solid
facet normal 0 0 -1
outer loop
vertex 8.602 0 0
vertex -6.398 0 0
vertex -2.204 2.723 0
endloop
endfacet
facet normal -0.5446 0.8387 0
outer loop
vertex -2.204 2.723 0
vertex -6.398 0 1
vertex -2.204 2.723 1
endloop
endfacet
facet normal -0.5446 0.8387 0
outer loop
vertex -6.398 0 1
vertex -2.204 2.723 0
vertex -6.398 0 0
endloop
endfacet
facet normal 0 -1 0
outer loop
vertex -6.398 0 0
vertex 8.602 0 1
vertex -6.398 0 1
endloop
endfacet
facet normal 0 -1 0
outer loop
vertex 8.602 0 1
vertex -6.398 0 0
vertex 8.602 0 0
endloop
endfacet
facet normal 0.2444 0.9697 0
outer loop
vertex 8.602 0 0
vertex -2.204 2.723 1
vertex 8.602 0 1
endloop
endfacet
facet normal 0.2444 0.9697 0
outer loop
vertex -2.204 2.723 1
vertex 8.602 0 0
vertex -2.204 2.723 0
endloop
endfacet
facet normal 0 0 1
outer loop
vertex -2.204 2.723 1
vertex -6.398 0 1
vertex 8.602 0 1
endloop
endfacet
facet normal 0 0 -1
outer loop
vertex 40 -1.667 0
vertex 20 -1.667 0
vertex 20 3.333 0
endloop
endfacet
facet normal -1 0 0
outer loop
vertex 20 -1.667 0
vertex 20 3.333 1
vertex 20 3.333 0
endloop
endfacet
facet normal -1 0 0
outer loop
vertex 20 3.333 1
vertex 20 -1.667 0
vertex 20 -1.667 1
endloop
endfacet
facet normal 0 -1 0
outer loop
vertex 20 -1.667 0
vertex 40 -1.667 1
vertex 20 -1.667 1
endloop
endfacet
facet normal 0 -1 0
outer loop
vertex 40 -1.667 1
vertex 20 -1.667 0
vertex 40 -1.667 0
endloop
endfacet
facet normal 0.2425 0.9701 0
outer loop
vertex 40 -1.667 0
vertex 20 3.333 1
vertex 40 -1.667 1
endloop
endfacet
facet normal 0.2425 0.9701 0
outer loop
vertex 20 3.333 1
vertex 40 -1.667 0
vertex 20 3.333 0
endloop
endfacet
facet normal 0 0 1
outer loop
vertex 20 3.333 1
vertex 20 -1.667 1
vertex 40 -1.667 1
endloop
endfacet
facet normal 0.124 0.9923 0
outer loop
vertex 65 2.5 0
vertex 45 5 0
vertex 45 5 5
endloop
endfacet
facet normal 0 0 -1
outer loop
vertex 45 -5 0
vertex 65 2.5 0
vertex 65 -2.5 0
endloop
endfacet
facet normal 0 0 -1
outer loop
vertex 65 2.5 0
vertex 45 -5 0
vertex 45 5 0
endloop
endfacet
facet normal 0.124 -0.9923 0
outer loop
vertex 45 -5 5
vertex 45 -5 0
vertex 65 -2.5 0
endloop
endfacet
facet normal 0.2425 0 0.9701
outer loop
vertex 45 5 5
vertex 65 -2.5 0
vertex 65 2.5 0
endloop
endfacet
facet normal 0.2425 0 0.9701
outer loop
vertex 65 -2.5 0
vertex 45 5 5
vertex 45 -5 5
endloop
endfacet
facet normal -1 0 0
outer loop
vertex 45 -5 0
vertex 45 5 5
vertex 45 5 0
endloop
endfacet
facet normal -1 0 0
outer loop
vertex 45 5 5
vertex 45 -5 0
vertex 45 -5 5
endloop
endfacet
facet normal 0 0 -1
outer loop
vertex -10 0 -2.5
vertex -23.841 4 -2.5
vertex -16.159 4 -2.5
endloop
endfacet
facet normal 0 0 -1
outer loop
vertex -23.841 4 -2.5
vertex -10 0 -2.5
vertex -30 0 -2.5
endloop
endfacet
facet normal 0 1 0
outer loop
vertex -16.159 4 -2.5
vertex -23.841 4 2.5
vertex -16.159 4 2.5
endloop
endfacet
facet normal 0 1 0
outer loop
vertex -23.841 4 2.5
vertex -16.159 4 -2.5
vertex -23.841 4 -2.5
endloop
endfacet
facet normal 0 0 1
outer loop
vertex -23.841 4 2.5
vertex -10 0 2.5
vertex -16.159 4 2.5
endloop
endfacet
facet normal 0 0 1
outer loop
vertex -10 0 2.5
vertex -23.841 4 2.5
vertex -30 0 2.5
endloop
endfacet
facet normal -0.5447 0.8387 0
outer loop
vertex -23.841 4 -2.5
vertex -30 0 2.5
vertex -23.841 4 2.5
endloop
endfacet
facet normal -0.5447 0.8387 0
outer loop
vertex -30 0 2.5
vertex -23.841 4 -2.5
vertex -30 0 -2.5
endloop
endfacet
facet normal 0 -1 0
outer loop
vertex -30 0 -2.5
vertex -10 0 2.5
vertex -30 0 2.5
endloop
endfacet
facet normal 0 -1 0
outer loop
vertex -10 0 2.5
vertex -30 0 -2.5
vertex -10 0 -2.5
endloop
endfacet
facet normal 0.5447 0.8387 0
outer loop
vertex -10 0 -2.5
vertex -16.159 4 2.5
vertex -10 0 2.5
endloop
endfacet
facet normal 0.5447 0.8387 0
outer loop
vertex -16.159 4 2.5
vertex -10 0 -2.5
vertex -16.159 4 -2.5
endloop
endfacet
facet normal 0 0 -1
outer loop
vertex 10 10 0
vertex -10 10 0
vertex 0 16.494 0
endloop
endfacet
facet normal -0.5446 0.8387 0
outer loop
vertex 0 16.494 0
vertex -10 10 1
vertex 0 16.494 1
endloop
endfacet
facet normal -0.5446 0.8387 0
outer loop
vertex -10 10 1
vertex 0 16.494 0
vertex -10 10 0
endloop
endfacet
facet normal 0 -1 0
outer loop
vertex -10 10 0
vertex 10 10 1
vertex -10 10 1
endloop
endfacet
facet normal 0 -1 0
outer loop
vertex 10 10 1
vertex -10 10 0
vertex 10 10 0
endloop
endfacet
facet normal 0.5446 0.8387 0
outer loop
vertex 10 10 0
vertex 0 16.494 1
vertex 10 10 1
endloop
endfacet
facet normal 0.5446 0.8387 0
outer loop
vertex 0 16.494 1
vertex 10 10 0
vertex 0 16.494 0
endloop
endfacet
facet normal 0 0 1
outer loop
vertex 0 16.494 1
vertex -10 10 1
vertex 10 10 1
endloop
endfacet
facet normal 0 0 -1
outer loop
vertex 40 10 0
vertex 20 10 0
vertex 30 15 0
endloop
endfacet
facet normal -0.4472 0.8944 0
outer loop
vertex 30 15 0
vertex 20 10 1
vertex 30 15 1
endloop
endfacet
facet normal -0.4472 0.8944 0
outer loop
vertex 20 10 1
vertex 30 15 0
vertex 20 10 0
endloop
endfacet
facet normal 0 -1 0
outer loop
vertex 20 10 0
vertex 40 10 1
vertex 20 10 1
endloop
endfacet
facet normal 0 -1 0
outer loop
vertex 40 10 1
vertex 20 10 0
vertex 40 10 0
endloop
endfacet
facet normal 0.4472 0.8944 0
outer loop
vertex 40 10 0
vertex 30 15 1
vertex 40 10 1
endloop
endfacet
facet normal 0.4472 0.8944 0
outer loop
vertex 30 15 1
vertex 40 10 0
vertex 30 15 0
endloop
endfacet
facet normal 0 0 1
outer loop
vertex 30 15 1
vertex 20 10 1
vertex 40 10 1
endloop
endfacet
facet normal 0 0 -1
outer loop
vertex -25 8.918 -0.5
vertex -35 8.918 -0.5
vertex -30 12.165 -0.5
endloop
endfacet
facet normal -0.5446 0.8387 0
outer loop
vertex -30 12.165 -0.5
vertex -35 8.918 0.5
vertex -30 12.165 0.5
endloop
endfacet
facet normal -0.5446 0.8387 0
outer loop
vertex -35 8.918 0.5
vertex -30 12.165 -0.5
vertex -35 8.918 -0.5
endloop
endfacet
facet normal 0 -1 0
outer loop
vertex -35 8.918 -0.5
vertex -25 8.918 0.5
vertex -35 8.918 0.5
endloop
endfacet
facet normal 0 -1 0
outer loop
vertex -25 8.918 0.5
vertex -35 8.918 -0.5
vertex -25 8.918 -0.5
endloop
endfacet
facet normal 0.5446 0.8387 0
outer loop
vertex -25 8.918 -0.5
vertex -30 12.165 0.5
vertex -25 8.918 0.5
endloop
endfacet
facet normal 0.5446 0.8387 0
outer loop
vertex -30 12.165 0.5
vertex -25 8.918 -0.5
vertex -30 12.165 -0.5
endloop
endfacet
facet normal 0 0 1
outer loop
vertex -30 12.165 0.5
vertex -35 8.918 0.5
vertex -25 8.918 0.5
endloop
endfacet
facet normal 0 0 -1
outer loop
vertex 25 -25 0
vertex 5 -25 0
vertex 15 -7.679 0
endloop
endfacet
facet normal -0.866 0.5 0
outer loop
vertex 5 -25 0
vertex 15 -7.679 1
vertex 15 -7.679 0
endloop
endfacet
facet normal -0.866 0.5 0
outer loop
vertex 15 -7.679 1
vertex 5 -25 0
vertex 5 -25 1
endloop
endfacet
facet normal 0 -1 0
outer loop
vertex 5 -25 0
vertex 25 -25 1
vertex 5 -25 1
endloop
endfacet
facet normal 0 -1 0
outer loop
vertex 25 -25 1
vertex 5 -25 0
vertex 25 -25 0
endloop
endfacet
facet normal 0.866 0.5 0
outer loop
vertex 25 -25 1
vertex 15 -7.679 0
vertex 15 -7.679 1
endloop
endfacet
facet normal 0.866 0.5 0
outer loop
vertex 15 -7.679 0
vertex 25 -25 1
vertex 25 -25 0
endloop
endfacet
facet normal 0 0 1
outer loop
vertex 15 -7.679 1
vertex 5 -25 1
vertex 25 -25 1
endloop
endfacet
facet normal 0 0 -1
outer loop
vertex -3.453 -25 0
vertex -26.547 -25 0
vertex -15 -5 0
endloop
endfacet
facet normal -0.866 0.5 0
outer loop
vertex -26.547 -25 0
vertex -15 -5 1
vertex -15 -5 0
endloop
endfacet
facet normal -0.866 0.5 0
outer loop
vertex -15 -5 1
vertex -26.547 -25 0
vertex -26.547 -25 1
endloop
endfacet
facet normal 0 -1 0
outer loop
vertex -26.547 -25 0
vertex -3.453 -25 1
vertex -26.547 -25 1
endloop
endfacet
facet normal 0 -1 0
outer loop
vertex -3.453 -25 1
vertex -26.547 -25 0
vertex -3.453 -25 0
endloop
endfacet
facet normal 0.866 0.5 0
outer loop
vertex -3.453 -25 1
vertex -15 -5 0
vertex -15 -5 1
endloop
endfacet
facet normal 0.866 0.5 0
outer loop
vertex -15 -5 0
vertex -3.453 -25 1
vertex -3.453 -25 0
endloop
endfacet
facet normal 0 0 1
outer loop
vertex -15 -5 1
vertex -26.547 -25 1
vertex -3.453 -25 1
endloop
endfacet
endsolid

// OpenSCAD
/*
Triangles.scad
 Author: Tim Koopman
 https://github.com/tkoopman/Delta-Diamond/blob/master/OpenSCAD/Triangles.scad

         angleCA
           /|\
        a / H \ c
         /  |  \
 angleAB ------- angleBC
            b

Standard Parameters
  center: true/false
    If true same as centerXYZ = [true, true, true]

  centerXYZ: Vector of 3 true/false values [CenterX, CenterY, CenterZ]
    center must be left undef

  height: The 3D height of the Triangle. Ignored if heights defined

  heights: Vector of 3 height values heights @ [angleAB, angleBC, angleCA]
    If CenterZ is true each height will be centered individually, this means
    the shape will be different depending on CenterZ. Most times you will want
    CenterZ to be true to get the shape most people want.
*/

/*
Triangle
  a: Length of side a
  b: Length of side b
  angle: angle at point angleAB
*/
module Triangle(
      a, b, angle, height=1, heights=undef,
      center=undef, centerXYZ=[false,false,false])
{
  // Calculate Heights at each point
  heightAB = ((heights==undef) ? height : heights[0])/2;
  heightBC = ((heights==undef) ? height : heights[1])/2;
  heightCA = ((heights==undef) ? height : heights[2])/2;
  centerZ = (center || (center==undef && centerXYZ[2]))?0:max(heightAB,heightBC,heightCA);

  // Calculate Offsets for centering
  offsetX = (center || (center==undef && centerXYZ[0]))?((cos(angle)*a)+b)/3:0;
  offsetY = (center || (center==undef && centerXYZ[1]))?(sin(angle)*a)/3:0;

  pointAB1 = [-offsetX,-offsetY, centerZ-heightAB];
  pointAB2 = [-offsetX,-offsetY, centerZ+heightAB];
  pointBC1 = [b-offsetX,-offsetY, centerZ-heightBC];
  pointBC2 = [b-offsetX,-offsetY, centerZ+heightBC];
  pointCA1 = [(cos(angle)*a)-offsetX,(sin(angle)*a)-offsetY, centerZ-heightCA];
  pointCA2 = [(cos(angle)*a)-offsetX,(sin(angle)*a)-offsetY, centerZ+heightCA];

  polyhedron(
    points=[  pointAB1, pointBC1, pointCA1,
          pointAB2, pointBC2, pointCA2 ],
    faces=[
      [0, 1, 2],
      [3, 5, 4],
      [0, 3, 1],
      [1, 3, 4],
      [1, 4, 2],
      [2, 4, 5],
      [2, 5, 0],
      [0, 5, 3] ] );
}

/*
Isosceles Triangle
  Exactly 2 of the following paramaters must be defined.
  If all 3 defined H will be ignored.
  b: length of side b
  angle: angle at points angleAB & angleBC.
*/
module Isosceles_Triangle(
      b, angle, H=undef, height=1, heights=undef,
      center=undef, centerXYZ=[true, false, false])
{
  valid =   (angle!=undef)?((angle < 90) && (b!=undef||H!=undef)) : (b!=undef&&H!=undef);
  ANGLE = (angle!=undef) ? angle : atan(H / (b/2));
  a = (b==undef)?(H/sin((180-(angle*2))/2)) :
     (b / cos(ANGLE))/2;
  B = (b==undef)? (cos(angle)*a)*2:b;
  if (valid)
  {
    Triangle(a=a, b=B, angle=ANGLE, height=height, heights=heights,
          center=center, centerXYZ=centerXYZ);
  } else {
    echo("Invalid Isosceles_Triangle. Must specify any 2 of b, angle and H, and if angle used angle must be less than 90");
  }
}

/*
Right Angled Triangle
  Create a Right Angled Triangle where the hypotenuse will be calculated.

       |\
      a| \
       |  \
       ----
         b
  a: length of side a
  b: length of side b
*/
module Right_Angled_Triangle(
      a, b, height=1, heights=undef,
      center=undef, centerXYZ=[false, false, false])
{
  Triangle(a=a, b=b, angle=90, height=height, heights=heights,
        center=center, centerXYZ=centerXYZ);
}

/*
Wedge
  Is same as Right Angled Triangle with 2 different heights, and rotated.
  Good for creating support structures.
*/
module Wedge(a, b, w1, w2)
{
  rotate([90,0,0])
    Right_Angled_Triangle(a, b, heights=[w1, w2, w1], centerXYZ=[false, false, true]);
}

/*
Equilateral Triangle
  Create a Equilateral Triangle.

  l: Length of all sides (a, b & c)
  H: Triangle size will be based on the this 2D height
    When using H, l is ignored.
*/
module Equilateral_Triangle(
      l=10, H=undef, height=1, heights=undef,
      center=undef, centerXYZ=[true,false,false])
{
  L = (H==undef)?l:H/sin(60);
  Triangle(a=L,b=L,angle=60,height=height, heights=heights,
        center=center, centerXYZ=centerXYZ);
}

/*
Trapezoid
  Create a Basic Trapezoid (Based on Isosceles_Triangle)

            d
          /----\
         /  |   \
     a  /   H    \ c
       /    |     \
 angle ------------ angle
            b

  b: Length of side b
  angle: Angle at points angleAB & angleBC
  H: The 2D height at which the triangle should be cut to create the trapezoid
  heights: If vector of size 3 (Standard for triangles) both cd & da will be the same height, if vector have 4 values [ab,bc,cd,da] than each point can have different heights.
*/
module Trapezoid(
      b, angle=60, H, height=1, heights=undef,
      center=undef, centerXYZ=[true,false,false])
{
  validAngle = (angle < 90);
  adX = H / tan(angle);

  // Calculate Heights at each point
  heightAB = ((heights==undef) ? height : heights[0])/2;
  heightBC = ((heights==undef) ? height : heights[1])/2;
  heightCD = ((heights==undef) ? height : heights[2])/2;
  heightDA = ((heights==undef) ? height : ((len(heights) > 3)?heights[3]:heights[2]))/2;

  // Centers
  centerX = (center || (center==undef && centerXYZ[0]))?0:b/2;
  centerY = (center || (center==undef && centerXYZ[1]))?0:H/2;
  centerZ = (center || (center==undef && centerXYZ[2]))?0:max(heightAB,heightBC,heightCD,heightDA);

  // Points
  y = H/2;
  bx = b/2;
  dx = (b-(adX*2))/2;

  pointAB1 = [centerX-bx, centerY-y, centerZ-heightAB];
  pointAB2 = [centerX-bx, centerY-y, centerZ+heightAB];
  pointBC1 = [centerX+bx, centerY-y, centerZ-heightBC];
  pointBC2 = [centerX+bx, centerY-y, centerZ+heightBC];
  pointCD1 = [centerX+dx, centerY+y, centerZ-heightCD];
  pointCD2 = [centerX+dx, centerY+y, centerZ+heightCD];
  pointDA1 = [centerX-dx, centerY+y, centerZ-heightDA];
  pointDA2 = [centerX-dx, centerY+y, centerZ+heightDA];

  validH = (adX < b/2);

  if (validAngle && validH)
  {
    polyhedron(
      points=[  pointAB1, pointBC1, pointCD1, pointDA1,
            pointAB2, pointBC2, pointCD2, pointDA2 ],
      triangles=[
        [0, 1, 2],
        [0, 2, 3],
        [4, 6, 5],
        [4, 7, 6],
        [0, 4, 1],
        [1, 4, 5],
        [1, 5, 2],
        [2, 5, 6],
        [2, 6, 3],
        [3, 6, 7],
        [3, 7, 0],
        [0, 7, 4]  ] );
  } else {
    if (!validAngle) echo("Trapezoid invalid, angle must be less than 90");
    else echo("Trapezoid invalid, H is larger than triangle");
  }
}


// Examples
Triangle(a=5, b=15, angle=33, centerXYZ=[true,false,false]);
translate([20,0,0]) Right_Angled_Triangle(a=5, b=20, centerXYZ=[false,true,false]);
translate([45,0,0]) Wedge(a=5, b=20, w1=10, w2=5);
translate([-20,0,0]) Trapezoid(b=20, angle=33, H=4, height=5, centerXYZ=[true,false,true]);

translate([0,10,0]) Isosceles_Triangle(b=20, angle=33);
translate([30,10,0]) Isosceles_Triangle(b=20, H=5);
translate([-30,10,0]) Isosceles_Triangle(angle=33, H=5, center=true);

translate([15,-25,0]) Equilateral_Triangle(l=20);
translate([-15,-25,0]) Equilateral_Triangle(H=20);
